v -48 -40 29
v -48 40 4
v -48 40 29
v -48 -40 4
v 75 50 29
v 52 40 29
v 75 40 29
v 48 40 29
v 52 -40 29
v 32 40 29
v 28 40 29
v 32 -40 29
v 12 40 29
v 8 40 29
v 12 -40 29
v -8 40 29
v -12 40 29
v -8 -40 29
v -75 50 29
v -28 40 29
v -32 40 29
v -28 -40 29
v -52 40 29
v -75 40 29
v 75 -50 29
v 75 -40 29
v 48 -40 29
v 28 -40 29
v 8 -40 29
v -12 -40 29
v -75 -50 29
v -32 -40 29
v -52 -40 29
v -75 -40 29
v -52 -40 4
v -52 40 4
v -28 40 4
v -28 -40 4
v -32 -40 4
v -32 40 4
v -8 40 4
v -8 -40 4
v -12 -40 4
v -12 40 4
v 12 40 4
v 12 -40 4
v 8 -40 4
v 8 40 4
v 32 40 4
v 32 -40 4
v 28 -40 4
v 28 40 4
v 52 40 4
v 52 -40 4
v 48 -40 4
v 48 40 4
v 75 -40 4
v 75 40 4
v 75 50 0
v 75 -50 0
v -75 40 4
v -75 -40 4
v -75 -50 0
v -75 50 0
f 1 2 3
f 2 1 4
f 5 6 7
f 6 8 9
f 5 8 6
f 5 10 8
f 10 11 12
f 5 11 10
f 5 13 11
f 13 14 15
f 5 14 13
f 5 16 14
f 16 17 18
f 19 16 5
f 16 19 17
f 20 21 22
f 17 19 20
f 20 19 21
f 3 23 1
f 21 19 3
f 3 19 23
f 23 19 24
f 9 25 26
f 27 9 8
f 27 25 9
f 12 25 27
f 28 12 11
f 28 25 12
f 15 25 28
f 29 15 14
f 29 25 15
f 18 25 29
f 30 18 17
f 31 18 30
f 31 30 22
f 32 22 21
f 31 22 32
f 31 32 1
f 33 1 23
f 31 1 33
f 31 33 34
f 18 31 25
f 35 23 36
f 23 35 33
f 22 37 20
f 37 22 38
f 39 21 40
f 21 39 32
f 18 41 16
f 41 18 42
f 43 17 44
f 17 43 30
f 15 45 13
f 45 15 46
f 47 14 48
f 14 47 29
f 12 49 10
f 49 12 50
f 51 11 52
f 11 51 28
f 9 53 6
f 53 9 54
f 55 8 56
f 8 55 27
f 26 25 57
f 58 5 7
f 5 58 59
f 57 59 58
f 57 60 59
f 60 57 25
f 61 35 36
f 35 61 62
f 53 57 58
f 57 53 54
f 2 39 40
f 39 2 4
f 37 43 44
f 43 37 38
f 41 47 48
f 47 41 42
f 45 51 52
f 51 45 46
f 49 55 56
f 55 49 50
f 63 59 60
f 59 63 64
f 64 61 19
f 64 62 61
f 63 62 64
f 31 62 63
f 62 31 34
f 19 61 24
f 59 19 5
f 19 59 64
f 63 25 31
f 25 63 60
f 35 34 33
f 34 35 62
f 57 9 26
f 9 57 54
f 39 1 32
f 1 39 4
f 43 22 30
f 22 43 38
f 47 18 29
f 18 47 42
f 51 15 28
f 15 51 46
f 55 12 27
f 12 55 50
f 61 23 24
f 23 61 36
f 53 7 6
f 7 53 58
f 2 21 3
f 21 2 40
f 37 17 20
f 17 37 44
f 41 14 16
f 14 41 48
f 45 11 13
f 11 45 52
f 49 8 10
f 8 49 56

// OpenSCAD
$fn = 32;

// ----------------------------------------------------------------------
// Rib frame 150 x 100 x 29
// 6 ribs at 20 mm pitch
// ----------------------------------------------------------------------

// --- parameters (mm) ---
frame = [150, 100, 4];  // base plate size (x, y, z)
rail_w = 10;            // side rail width
ribs = 6;               // number of ribs
rib_t = 4;              // rib thickness
rib_h = 25;             // rib height above the base plate
pitch = 20;             // pitch between rib centres

// --- derived feature positions (mm) ---
span = (ribs - 1) * pitch;          // = 100   distance between the outer ribs
origin_x = -span / 2;               // = -50   X of the first rib
rib_len = frame[1] - 2 * rail_w + 2;  // = 82   rib length, 1 mm into each rail
feature_centers = [
  [origin_x + 0 * pitch, 0],
  [origin_x + 1 * pitch, 0],
  [origin_x + 2 * pitch, 0],
  [origin_x + 3 * pitch, 0],
  [origin_x + 4 * pitch, 0],
  [origin_x + 5 * pitch, 0]
];   // rib centre line, drives the rib loop

// base plate, two side rails, then the ribs read straight off feature_centers
union() {
  translate([-frame[0] / 2, -frame[1] / 2, 0]) cube(frame);
  translate([-frame[0] / 2, -frame[1] / 2, 0]) cube([frame[0], rail_w, frame[2] + rib_h]);
  translate([-frame[0] / 2, frame[1] / 2 - rail_w, 0]) cube([frame[0], rail_w, frame[2] + rib_h]);
  for (centre = feature_centers)
    translate([centre[0] - rib_t / 2, centre[1] - rib_len / 2, frame[2] - 1])
      cube([rib_t, rib_len, rib_h + 1]);
}
